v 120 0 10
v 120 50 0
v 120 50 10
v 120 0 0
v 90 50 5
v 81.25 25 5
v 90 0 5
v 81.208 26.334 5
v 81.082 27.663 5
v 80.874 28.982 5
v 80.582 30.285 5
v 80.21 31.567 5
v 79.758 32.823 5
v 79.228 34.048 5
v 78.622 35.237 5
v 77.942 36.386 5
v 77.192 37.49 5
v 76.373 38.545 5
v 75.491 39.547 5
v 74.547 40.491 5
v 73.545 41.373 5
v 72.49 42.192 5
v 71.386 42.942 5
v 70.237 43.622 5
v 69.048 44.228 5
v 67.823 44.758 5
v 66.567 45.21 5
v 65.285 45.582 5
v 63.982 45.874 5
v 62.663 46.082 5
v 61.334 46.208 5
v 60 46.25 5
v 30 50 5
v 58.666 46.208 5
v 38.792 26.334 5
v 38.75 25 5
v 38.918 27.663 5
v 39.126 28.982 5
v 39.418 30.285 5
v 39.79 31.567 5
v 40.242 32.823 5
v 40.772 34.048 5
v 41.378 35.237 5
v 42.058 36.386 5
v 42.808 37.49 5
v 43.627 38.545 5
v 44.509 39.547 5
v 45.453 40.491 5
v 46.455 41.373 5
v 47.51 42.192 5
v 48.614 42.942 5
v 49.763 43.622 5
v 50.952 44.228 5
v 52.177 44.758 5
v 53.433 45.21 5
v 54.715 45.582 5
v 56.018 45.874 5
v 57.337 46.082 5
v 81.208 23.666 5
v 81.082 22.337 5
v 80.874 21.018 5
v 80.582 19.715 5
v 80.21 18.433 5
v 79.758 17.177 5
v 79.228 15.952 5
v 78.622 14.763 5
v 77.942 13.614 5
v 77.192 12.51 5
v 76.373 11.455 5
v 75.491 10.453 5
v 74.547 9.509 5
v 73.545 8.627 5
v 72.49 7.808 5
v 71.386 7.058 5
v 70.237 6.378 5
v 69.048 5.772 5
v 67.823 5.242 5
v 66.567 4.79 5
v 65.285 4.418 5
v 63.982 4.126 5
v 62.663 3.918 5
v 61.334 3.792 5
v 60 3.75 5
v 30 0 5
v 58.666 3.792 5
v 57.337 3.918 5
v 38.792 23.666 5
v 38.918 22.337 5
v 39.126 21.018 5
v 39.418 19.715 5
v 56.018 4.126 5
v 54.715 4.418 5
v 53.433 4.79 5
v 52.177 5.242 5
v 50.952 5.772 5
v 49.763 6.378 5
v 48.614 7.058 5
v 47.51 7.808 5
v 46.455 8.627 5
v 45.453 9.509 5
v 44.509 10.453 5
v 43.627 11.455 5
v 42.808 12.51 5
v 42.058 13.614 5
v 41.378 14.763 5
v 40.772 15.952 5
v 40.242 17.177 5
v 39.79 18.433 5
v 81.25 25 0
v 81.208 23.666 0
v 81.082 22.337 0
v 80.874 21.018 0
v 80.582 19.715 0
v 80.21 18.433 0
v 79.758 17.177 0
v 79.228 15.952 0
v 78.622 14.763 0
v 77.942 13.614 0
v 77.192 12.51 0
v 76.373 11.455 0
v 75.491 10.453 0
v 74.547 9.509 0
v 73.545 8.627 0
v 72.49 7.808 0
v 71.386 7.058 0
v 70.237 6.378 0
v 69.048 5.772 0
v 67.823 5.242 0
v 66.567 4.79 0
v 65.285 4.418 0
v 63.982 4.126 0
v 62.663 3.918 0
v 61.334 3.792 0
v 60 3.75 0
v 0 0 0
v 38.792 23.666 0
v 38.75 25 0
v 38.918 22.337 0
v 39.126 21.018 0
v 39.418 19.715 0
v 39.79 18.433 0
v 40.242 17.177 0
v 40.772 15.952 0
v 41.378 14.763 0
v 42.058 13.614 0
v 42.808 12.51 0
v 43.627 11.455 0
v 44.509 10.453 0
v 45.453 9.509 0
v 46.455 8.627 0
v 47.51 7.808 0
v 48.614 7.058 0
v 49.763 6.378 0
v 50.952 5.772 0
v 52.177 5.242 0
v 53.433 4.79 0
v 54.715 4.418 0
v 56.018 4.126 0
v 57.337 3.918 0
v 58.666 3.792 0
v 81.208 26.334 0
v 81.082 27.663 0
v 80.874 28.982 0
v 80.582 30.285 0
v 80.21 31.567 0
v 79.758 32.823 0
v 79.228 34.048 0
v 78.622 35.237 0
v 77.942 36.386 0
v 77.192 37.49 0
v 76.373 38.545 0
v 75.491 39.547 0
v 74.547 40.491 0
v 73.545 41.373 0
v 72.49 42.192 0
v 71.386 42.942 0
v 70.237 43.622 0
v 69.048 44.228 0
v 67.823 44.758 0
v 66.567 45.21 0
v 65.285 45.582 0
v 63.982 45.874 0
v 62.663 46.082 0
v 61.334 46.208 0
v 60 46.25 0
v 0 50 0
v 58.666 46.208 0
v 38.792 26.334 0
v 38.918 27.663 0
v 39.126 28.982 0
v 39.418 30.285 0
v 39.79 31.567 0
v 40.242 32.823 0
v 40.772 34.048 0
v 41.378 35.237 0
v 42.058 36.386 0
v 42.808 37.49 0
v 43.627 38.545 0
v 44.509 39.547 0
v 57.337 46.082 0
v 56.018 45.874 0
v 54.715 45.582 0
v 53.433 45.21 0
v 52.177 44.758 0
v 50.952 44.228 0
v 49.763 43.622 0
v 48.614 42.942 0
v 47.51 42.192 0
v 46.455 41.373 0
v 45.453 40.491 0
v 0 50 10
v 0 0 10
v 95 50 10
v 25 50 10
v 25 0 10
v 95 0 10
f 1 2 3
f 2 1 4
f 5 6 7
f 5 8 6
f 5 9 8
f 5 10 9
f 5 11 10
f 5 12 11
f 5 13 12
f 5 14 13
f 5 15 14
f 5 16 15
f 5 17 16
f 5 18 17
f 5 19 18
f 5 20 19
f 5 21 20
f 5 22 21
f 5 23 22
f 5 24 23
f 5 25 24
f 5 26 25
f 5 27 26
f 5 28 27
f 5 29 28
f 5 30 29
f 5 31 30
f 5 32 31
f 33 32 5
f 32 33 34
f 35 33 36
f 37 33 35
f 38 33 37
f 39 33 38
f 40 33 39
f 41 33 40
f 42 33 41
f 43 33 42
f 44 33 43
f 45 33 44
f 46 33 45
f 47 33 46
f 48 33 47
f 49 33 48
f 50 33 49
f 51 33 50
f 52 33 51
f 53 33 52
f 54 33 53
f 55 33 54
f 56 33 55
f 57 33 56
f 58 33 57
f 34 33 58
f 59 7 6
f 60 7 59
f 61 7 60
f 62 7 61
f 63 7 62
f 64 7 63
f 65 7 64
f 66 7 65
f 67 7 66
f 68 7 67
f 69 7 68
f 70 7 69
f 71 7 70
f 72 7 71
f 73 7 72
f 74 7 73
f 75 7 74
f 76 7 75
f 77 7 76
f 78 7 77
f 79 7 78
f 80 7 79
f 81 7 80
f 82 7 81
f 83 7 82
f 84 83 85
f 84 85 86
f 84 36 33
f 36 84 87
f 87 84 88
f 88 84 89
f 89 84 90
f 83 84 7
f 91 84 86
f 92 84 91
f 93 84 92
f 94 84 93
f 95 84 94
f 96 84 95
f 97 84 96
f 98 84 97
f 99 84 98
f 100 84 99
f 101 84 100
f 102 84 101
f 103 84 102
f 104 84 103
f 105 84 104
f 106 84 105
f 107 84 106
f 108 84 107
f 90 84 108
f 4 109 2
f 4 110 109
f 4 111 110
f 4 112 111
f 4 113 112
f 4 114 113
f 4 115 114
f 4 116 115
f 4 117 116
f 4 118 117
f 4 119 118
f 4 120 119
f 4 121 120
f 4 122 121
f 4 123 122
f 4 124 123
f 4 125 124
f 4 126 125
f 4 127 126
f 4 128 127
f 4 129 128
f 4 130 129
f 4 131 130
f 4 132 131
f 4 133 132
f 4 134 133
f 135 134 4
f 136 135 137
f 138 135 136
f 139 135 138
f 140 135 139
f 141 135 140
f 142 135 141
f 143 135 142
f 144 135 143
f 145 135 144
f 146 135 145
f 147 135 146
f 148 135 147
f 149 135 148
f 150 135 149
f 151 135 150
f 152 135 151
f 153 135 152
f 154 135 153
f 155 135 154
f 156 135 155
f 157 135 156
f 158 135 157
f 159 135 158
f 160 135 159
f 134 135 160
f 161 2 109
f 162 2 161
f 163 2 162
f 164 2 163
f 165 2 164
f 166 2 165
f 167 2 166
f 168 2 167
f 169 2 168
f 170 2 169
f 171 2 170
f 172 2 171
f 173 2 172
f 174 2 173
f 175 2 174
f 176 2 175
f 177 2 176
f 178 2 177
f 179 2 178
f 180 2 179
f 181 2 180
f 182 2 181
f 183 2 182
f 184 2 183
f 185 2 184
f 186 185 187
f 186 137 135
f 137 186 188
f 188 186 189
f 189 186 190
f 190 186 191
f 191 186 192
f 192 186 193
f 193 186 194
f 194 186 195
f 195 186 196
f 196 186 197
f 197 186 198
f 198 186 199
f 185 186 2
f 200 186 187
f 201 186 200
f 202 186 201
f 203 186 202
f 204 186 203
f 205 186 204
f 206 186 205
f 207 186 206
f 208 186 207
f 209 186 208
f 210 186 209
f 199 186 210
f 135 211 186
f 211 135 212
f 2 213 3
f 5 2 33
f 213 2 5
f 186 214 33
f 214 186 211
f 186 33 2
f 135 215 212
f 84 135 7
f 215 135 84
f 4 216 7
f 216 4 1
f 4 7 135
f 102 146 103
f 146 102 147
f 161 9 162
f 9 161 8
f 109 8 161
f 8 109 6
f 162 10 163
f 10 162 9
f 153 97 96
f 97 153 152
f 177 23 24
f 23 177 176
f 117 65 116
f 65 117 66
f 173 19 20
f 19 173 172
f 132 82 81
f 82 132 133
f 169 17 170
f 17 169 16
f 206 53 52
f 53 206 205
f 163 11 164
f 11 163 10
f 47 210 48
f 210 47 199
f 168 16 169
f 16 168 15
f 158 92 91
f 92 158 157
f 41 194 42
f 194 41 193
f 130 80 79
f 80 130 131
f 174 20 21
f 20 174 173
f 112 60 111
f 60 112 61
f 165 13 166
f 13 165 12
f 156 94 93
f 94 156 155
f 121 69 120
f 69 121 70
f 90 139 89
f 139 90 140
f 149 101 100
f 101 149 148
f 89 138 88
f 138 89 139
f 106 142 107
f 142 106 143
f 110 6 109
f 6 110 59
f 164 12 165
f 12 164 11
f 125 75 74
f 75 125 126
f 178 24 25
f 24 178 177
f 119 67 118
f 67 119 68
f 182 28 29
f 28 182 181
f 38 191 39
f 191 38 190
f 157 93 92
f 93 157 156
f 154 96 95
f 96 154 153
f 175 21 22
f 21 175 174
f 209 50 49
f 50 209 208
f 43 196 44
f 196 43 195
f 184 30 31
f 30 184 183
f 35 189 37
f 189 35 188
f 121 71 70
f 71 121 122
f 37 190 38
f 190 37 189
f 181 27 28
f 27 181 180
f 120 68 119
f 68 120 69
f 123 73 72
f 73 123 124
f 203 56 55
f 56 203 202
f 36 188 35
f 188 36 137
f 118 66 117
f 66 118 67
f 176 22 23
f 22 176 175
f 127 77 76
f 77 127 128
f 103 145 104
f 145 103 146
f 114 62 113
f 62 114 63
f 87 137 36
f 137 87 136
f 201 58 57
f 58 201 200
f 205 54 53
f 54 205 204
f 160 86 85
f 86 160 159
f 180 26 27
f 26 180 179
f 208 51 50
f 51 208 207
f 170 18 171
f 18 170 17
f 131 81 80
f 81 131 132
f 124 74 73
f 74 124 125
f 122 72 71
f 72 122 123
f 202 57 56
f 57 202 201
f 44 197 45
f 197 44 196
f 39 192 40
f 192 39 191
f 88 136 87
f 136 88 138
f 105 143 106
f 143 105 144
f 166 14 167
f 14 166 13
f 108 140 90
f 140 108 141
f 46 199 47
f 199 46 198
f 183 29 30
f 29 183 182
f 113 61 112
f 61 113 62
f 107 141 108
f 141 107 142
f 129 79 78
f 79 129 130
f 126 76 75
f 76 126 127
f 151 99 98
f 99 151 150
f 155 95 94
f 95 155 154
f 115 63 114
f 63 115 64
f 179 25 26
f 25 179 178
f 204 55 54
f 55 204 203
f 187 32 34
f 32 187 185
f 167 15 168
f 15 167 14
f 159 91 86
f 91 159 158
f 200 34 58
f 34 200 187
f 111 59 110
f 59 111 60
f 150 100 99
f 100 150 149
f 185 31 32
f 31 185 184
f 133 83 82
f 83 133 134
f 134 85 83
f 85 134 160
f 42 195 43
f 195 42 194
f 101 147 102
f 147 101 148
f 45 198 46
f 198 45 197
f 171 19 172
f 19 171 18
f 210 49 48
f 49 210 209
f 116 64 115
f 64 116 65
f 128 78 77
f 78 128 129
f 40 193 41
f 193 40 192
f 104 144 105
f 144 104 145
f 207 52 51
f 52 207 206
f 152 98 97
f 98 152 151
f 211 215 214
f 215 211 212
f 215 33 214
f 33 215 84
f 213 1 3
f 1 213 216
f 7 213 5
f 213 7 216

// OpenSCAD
HOLDER_WIDTH = 120;
HOLDER_DEPTH = 50;

$fn = 100;

difference() {
    cube([HOLDER_WIDTH, HOLDER_DEPTH, 5]);
    translate([HOLDER_WIDTH/2, HOLDER_DEPTH/2, 2]) {
        cylinder(d=42.5, h=8, center=true);
    }
}

// rises on each end to allow for the hygrometer to stick out a bit
module spacer() {
    translate([0, 0, 5]) {
        cube([25, HOLDER_DEPTH, 5]);
        // wedge based ramp
        translate([25, 0, 0])
        polyhedron(points=[[0, 0, 5], [5, 0, 0], [5, HOLDER_DEPTH, 0], [0, HOLDER_DEPTH, 5], [0, 0, 0], [0, HOLDER_DEPTH, 0]], faces=[
            // ramp
            [0, 1, 2, 3],
            // bottom
            [4, 5, 2, 1],
            // left side (x=0)
            [4, 0, 3, 5],
            // front (y=0)
            [4, 1, 0],
            // back (y=HOLDER_DEPTH)
            [5, 3, 2]
        ]);
    }
}

spacer();

translate([HOLDER_WIDTH, 0, 0])
mirror([1, 0, 0])
spacer();
